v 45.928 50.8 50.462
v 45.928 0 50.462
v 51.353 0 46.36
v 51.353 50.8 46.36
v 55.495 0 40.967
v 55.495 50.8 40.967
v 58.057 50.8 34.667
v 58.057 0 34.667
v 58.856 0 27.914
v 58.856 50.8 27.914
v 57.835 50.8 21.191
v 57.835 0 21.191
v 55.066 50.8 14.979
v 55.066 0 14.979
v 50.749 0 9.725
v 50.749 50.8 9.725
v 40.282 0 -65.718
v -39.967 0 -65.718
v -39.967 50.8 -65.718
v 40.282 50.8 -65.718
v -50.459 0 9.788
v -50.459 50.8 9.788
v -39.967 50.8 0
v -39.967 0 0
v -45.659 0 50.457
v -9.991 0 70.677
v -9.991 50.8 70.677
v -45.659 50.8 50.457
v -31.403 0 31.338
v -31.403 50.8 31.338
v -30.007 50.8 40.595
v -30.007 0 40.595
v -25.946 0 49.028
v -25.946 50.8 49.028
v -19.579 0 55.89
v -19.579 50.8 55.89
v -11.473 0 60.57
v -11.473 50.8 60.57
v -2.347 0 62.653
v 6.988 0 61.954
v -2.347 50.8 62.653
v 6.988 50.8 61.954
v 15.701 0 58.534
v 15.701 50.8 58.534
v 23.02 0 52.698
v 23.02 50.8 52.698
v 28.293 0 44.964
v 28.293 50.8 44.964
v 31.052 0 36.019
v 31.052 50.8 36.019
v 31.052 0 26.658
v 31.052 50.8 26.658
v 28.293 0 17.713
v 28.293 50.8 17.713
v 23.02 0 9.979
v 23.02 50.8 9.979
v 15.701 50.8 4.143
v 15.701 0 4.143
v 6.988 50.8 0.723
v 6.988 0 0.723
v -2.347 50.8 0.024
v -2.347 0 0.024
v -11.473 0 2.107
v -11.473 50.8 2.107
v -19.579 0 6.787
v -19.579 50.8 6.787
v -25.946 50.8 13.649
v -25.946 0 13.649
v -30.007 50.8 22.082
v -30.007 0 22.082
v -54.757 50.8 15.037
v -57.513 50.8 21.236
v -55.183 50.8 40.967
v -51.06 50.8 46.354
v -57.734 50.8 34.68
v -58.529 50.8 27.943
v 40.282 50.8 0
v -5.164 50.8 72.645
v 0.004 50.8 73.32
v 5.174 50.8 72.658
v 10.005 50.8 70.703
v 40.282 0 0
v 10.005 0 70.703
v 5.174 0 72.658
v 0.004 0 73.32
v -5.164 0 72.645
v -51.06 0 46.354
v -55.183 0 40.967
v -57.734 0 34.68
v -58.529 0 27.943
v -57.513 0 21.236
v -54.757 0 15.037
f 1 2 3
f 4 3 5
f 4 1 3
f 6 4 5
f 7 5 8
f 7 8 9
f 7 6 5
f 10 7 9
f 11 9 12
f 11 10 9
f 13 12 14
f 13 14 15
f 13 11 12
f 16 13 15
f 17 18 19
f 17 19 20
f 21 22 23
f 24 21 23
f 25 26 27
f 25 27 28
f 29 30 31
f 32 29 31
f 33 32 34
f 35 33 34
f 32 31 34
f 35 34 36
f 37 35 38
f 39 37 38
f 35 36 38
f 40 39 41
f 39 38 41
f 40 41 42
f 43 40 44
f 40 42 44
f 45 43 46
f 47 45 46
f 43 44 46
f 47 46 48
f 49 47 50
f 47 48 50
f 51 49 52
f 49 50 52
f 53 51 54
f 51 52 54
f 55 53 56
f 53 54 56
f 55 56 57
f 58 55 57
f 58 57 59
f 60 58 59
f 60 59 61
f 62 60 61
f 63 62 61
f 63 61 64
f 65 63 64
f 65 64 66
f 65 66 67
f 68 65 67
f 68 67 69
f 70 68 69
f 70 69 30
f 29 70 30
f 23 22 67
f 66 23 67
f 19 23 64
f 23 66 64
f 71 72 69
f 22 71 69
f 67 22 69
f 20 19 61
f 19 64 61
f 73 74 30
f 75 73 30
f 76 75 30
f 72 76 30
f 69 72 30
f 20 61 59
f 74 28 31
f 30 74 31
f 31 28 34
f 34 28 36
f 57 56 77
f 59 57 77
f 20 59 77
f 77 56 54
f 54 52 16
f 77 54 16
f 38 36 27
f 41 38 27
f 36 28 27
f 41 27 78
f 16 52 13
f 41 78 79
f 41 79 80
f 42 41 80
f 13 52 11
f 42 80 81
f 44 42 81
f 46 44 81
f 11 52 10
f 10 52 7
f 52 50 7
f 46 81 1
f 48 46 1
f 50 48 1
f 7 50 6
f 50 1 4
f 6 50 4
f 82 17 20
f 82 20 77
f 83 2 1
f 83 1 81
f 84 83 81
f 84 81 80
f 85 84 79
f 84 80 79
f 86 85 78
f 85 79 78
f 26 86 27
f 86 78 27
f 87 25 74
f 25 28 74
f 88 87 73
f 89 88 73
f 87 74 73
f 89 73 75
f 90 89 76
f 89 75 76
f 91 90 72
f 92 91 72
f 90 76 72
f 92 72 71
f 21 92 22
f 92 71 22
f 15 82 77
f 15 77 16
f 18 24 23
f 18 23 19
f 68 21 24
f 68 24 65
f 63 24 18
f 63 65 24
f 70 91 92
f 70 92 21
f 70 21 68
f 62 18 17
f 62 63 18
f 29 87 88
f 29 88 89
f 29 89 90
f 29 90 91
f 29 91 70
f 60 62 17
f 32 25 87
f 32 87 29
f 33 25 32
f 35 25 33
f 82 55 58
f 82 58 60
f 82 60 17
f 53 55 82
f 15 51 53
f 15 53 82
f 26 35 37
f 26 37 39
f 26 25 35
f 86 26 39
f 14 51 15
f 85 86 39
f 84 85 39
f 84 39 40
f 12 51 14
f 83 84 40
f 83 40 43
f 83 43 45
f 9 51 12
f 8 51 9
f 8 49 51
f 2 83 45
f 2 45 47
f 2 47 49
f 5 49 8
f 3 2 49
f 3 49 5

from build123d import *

# Parameters (mm, degrees)
F1_DEPTH = 50.8
F2_R     = 20.32
F3_R     = 25.4
F4_R     = 25.4
F5_R     = 31.402623
F6_DEPTH = 50.801


with BuildPart() as f1:
    # F0 (on Front) → F1 (new body)
    with BuildSketch(Plane.XZ):
        Polygon((-39.967455, -65.717764), (40.282056, -65.717764), (40.282056, 0), (76.221071, 33.392798), (0, 76.340705), (-75.760126, 33.392798), (-39.967455, 0), align=None)
    extrude(amount=-F1_DEPTH)

    # F2
    f2_edges = [f1.edges().sort_by_distance(p)[0] for p in [
        (0, 25.4, 76.340705),
    ]]
    fillet(f2_edges, radius=F2_R)

    # F3
    f3_edges = [f1.edges().sort_by_distance(p)[0] for p in [
        (76.221071, 25.4, 33.392798),
    ]]
    fillet(f3_edges, radius=F3_R)

    # F4
    f4_edges = [f1.edges().sort_by_distance(p)[0] for p in [
        (-75.760126, 25.4, 33.392798),
    ]]
    fillet(f4_edges, radius=F4_R)

    # F5 (on face) → F6 (cut, through all)
    with BuildSketch(Plane(origin=(0, 50.8, 0), x_dir=(-1, 0, 0), z_dir=(0, 1, 0))):
        with Locations((0, 31.338445)):
            Circle(F5_R)
    extrude(amount=-F6_DEPTH, mode=Mode.SUBTRACT)


solid = f1.part
